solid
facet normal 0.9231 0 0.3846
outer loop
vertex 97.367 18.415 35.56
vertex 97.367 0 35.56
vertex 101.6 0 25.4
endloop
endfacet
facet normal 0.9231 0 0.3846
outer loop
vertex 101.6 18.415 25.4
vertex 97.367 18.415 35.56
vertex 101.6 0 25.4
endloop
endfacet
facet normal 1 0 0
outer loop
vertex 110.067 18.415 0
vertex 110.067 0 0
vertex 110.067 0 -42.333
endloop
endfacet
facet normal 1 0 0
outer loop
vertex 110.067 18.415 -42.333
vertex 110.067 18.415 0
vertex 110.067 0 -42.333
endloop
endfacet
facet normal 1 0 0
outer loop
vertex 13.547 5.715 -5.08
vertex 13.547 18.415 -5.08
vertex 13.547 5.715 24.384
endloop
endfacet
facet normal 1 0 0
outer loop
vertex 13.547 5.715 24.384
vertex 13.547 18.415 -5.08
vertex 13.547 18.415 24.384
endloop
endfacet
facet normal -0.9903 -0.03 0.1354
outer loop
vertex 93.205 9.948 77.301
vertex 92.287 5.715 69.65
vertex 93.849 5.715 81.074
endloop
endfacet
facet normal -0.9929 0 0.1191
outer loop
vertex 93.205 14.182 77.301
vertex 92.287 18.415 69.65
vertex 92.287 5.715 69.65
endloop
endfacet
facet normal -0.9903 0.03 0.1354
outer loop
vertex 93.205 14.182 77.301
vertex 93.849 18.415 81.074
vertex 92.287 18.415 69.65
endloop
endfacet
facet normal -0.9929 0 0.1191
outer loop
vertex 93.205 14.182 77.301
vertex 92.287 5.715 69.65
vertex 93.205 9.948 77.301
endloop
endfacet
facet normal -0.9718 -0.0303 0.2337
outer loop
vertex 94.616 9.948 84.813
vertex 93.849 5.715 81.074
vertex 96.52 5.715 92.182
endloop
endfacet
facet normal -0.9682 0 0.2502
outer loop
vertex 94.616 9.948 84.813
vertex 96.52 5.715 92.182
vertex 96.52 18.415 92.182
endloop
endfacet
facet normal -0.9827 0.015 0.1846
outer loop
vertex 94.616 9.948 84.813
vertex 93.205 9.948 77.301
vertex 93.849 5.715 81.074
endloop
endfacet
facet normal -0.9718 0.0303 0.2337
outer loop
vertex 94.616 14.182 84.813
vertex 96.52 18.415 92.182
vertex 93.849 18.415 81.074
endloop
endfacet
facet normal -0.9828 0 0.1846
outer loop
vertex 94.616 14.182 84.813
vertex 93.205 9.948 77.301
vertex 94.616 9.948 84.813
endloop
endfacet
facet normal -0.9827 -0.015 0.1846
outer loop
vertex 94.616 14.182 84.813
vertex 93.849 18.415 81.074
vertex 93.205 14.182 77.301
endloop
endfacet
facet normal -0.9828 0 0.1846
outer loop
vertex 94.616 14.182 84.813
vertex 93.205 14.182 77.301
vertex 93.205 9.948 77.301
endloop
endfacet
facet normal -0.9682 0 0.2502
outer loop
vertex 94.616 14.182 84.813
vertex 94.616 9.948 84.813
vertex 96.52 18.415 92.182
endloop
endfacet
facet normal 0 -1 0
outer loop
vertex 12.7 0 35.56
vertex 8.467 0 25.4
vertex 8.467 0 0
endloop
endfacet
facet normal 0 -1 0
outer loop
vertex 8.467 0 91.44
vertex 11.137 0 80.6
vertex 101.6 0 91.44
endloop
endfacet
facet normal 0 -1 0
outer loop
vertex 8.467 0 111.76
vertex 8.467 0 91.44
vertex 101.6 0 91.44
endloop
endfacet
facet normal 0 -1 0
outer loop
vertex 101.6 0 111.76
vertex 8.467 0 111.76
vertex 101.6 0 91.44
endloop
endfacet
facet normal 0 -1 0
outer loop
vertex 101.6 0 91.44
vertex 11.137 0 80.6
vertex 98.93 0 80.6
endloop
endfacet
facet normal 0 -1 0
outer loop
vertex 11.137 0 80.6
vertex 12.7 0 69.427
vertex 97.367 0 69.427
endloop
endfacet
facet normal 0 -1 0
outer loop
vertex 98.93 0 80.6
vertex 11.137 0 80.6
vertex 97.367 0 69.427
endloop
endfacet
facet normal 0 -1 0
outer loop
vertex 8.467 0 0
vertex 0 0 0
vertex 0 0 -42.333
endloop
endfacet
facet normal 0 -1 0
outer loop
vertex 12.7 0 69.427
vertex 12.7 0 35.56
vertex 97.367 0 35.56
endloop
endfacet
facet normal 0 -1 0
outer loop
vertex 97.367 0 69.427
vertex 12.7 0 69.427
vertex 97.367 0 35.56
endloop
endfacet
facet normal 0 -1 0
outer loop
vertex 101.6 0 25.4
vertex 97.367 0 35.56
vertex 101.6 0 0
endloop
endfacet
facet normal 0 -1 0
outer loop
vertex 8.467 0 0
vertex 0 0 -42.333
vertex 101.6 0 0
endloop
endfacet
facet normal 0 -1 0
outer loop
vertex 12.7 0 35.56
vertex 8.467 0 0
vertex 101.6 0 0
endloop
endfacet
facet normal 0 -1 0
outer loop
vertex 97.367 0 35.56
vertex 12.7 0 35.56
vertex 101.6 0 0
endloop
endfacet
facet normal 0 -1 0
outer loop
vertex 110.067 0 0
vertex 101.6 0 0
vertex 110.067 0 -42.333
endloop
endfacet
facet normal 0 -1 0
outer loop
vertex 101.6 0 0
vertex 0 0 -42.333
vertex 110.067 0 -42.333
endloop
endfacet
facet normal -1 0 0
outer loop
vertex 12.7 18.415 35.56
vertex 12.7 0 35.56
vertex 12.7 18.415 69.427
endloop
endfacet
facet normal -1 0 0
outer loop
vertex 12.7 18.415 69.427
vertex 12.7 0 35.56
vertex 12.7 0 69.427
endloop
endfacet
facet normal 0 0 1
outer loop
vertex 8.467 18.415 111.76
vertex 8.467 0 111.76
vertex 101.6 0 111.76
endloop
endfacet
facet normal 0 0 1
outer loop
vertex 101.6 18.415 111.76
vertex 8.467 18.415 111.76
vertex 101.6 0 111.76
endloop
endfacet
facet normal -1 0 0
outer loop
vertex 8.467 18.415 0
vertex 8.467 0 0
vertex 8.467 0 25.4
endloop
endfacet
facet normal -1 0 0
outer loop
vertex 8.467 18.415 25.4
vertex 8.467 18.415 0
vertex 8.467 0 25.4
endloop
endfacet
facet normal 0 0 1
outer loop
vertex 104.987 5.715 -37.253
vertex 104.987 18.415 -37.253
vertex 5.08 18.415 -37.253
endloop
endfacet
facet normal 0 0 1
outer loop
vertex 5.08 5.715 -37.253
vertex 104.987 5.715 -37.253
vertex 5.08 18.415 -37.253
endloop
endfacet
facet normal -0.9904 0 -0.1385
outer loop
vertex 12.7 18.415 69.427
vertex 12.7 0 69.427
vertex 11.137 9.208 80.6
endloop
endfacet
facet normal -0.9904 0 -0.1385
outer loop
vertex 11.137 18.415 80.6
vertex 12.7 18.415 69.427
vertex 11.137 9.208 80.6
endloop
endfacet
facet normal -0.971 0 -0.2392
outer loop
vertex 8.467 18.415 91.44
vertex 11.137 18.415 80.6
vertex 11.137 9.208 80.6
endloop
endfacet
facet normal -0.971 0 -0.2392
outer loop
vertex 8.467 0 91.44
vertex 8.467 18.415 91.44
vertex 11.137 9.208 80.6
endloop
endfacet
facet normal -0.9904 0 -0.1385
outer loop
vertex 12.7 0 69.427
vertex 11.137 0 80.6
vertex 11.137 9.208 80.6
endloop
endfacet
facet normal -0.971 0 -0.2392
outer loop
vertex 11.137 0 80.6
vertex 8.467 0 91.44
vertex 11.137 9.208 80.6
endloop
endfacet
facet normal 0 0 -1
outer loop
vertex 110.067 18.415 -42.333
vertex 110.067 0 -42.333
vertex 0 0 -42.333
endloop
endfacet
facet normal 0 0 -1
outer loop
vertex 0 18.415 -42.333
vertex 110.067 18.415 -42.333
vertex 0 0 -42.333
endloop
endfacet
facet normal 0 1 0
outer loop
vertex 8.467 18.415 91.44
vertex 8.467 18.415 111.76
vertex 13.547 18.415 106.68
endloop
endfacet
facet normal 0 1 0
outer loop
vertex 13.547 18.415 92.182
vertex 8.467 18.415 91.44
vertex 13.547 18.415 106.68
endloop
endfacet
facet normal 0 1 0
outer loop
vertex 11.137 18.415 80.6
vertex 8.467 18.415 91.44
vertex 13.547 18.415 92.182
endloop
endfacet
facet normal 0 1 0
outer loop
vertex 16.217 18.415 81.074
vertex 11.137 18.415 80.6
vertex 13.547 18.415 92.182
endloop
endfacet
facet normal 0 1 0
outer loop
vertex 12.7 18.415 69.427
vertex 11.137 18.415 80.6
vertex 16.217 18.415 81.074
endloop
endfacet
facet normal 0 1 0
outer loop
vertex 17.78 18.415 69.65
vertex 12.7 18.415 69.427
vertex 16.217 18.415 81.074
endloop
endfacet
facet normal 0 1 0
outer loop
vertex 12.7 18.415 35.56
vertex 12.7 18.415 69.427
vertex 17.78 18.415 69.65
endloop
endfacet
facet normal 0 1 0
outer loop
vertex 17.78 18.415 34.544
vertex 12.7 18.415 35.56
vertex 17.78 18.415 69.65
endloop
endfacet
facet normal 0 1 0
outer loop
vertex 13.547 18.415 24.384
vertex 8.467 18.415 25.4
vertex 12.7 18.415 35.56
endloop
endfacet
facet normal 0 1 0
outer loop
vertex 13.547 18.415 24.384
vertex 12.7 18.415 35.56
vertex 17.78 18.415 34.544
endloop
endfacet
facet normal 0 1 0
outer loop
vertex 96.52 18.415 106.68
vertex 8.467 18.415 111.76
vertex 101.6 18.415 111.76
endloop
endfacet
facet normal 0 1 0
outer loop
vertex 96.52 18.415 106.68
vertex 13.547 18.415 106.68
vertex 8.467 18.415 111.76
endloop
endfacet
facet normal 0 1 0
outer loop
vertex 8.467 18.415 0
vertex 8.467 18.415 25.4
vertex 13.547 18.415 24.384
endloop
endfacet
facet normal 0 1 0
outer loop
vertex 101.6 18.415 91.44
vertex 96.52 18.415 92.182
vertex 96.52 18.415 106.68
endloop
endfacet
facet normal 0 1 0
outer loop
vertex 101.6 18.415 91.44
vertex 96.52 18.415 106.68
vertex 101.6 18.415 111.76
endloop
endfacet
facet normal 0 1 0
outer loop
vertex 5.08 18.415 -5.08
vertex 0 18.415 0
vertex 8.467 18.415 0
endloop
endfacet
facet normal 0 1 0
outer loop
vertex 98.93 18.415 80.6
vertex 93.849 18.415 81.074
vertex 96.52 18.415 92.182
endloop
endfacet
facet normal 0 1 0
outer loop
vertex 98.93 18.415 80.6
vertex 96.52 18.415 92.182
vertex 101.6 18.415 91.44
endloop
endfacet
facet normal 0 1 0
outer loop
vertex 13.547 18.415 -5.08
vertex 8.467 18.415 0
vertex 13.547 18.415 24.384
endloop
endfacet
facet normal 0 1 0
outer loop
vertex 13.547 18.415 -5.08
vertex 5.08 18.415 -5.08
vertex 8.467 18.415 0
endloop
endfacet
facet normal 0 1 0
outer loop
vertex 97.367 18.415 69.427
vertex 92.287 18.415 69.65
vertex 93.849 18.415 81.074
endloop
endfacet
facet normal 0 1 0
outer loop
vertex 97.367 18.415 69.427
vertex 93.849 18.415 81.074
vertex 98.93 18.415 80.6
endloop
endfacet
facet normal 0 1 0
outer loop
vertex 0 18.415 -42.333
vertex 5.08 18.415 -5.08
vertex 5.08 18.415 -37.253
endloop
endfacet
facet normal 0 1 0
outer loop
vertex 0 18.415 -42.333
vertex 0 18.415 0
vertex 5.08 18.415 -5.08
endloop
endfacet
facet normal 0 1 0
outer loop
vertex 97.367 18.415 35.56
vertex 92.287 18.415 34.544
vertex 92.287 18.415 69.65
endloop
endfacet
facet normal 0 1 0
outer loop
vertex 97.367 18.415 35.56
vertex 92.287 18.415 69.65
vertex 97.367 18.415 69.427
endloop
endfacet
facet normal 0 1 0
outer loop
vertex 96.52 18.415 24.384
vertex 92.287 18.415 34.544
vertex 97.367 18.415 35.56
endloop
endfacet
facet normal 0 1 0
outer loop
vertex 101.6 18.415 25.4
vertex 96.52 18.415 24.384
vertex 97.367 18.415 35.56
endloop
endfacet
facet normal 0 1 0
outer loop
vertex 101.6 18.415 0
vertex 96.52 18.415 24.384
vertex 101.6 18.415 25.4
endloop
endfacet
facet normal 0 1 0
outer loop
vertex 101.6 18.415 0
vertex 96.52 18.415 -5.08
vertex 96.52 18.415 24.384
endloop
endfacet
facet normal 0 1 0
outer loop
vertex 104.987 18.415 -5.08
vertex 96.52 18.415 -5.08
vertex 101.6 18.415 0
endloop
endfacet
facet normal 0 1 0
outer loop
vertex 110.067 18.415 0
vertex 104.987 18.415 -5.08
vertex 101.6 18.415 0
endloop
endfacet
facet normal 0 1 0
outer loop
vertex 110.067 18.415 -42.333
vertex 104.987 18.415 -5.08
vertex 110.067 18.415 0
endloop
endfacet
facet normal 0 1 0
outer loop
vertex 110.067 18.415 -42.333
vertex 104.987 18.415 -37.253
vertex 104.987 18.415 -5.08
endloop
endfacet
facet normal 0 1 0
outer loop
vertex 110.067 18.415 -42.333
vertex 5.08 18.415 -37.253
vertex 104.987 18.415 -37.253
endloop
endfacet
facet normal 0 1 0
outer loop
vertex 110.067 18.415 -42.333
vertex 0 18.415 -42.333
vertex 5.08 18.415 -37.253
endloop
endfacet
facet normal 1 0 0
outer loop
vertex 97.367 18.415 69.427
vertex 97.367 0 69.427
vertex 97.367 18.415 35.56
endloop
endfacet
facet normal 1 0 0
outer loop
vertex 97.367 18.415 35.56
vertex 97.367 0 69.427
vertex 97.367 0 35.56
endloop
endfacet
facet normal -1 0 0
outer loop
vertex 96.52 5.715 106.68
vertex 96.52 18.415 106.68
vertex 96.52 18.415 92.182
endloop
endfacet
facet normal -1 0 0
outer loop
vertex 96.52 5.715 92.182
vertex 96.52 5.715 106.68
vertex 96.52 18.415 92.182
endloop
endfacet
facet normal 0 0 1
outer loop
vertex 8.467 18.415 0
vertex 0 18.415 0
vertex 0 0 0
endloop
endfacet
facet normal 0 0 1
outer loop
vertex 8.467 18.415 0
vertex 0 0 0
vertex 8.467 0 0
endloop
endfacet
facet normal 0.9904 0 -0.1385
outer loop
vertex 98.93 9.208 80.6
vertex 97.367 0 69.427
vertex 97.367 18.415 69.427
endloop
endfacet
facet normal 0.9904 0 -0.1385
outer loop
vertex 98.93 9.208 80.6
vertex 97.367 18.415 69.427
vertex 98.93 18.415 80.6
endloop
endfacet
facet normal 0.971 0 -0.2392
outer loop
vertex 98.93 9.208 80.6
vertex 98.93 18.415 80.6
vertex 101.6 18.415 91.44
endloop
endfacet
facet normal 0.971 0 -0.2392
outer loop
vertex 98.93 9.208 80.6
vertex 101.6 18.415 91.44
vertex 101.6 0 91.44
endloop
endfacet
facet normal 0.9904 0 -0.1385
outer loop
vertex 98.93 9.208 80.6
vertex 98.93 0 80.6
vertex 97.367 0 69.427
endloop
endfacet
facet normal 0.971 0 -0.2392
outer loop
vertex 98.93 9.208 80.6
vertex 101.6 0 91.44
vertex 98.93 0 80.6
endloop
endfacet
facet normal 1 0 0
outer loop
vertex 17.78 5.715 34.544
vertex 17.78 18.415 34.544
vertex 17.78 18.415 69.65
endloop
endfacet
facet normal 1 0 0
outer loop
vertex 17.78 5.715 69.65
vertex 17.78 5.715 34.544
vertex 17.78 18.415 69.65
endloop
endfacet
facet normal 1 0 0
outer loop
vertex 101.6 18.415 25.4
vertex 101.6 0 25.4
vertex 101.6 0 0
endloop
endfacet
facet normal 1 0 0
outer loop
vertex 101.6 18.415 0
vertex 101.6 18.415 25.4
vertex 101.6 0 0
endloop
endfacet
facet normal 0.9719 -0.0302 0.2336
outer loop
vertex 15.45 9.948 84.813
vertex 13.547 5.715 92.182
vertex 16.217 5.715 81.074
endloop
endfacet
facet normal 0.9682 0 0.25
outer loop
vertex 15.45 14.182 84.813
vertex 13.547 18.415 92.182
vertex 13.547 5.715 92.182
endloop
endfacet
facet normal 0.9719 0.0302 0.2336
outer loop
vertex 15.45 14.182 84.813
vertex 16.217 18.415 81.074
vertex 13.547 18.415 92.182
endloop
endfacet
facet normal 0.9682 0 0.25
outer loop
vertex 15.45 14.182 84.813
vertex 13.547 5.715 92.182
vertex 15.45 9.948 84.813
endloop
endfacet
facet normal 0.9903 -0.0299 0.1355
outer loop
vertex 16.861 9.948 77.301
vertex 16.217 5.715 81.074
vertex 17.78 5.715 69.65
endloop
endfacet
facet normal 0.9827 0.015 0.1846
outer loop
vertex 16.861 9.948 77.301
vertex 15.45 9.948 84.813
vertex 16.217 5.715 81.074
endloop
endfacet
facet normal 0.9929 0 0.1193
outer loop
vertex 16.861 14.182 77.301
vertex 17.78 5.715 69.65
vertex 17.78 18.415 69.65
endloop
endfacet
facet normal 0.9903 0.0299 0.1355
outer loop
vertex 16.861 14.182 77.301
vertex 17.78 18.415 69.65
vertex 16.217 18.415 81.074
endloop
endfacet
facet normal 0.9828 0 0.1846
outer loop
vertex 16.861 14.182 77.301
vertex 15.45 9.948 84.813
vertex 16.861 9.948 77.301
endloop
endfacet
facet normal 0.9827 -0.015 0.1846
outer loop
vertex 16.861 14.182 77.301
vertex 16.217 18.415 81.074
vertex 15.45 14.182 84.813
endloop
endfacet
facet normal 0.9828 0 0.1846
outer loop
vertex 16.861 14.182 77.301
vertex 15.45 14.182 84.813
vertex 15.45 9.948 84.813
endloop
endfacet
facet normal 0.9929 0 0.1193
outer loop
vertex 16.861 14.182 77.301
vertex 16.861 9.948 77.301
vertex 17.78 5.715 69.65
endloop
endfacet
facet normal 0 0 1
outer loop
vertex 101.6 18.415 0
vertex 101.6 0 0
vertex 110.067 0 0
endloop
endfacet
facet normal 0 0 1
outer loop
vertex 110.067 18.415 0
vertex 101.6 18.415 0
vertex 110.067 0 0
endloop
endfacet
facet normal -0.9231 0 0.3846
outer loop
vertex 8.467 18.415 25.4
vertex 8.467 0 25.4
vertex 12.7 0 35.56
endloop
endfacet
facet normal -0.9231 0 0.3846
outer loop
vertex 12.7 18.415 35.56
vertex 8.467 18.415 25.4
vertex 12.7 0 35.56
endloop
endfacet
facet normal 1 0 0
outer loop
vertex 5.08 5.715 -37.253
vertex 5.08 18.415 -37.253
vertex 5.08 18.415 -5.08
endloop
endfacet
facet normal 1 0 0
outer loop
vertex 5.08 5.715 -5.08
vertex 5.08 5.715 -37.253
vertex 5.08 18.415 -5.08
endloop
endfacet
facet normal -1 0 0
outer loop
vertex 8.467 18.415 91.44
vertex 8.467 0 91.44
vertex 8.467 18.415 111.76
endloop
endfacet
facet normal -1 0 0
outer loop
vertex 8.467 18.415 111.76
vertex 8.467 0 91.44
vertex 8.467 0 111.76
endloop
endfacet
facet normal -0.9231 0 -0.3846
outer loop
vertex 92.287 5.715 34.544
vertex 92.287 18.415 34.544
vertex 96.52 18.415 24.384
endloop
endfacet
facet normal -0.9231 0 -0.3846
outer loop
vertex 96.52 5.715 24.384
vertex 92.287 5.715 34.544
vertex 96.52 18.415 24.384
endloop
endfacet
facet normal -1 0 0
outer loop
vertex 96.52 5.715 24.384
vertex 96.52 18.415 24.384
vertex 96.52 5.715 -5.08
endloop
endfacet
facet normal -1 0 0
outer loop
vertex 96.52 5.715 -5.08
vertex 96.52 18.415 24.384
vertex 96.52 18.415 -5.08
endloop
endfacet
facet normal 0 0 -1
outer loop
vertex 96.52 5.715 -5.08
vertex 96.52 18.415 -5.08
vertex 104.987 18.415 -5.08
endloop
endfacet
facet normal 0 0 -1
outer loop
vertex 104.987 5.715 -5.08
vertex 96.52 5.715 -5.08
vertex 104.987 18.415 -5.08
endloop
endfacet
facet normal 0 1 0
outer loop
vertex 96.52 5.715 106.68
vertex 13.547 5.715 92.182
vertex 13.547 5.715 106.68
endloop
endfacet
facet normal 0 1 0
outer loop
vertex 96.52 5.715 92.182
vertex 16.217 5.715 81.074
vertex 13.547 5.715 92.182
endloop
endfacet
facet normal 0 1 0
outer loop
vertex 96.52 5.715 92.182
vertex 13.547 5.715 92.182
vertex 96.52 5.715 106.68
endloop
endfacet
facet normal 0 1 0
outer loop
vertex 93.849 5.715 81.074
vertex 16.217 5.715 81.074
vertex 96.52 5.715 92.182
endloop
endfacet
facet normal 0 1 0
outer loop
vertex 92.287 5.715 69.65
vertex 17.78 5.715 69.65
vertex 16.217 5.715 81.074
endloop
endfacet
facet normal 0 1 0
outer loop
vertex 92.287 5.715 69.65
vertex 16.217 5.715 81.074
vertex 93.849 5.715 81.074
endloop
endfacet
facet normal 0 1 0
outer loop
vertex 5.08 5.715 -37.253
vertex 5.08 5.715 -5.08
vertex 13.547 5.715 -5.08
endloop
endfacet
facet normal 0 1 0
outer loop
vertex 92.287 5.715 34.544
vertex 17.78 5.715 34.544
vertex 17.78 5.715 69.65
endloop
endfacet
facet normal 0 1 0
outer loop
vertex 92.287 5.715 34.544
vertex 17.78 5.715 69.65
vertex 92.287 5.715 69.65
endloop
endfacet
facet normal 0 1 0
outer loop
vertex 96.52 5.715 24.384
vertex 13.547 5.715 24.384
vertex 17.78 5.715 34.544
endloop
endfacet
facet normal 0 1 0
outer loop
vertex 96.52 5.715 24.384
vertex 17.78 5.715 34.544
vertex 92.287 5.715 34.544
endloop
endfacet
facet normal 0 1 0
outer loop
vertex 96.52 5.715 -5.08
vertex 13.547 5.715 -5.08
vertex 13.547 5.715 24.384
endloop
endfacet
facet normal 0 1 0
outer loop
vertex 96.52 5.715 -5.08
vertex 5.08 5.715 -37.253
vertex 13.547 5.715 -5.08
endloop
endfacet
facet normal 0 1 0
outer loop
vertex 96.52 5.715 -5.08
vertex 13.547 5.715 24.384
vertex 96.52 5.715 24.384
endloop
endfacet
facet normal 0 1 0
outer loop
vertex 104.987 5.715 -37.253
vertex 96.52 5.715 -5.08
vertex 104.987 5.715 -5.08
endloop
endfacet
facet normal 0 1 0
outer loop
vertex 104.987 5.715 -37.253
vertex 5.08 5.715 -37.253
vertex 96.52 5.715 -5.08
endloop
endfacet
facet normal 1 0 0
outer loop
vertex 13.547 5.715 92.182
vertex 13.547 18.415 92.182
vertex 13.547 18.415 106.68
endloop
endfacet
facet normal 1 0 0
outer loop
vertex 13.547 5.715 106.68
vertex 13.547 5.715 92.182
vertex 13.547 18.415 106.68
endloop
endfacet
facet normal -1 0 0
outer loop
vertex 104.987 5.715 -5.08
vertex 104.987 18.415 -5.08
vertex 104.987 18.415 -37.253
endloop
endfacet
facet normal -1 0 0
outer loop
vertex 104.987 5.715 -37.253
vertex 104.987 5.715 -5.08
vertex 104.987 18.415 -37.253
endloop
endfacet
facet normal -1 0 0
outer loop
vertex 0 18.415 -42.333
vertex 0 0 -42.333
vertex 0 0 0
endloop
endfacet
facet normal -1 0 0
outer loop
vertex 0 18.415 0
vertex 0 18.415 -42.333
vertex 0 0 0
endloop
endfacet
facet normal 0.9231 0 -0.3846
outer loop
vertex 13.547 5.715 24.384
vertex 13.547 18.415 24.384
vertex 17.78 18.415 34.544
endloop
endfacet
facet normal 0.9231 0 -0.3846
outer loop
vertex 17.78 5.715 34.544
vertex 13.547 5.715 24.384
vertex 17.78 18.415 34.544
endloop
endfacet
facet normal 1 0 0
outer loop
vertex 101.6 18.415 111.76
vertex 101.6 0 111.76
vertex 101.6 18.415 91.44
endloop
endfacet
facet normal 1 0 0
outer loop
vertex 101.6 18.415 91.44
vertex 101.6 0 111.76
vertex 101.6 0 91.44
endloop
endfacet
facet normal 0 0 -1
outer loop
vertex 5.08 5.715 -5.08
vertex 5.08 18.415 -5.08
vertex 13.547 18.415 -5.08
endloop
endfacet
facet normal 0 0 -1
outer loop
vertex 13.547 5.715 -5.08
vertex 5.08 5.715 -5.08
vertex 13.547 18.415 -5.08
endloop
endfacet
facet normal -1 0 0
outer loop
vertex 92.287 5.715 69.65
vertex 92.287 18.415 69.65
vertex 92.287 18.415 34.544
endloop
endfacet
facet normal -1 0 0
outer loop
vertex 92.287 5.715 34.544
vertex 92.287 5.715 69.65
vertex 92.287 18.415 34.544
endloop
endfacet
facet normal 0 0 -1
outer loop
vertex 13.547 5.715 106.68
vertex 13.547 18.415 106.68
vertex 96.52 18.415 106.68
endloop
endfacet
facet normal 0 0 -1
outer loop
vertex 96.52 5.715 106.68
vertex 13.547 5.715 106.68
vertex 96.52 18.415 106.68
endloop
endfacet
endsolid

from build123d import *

# Parameters (mm, degrees)
BOSS_EXTRUDE1_DEPTH = 18.415
CUT_EXTRUDE1_DEPTH  = 12.7


with BuildPart() as part:
    # Sketch3 → Boss-Extrude1 (new body)
    with BuildSketch(Plane(origin=(0, 0, 0), x_dir=(1, 0, 0), z_dir=(0, 1, 0))):
        with BuildLine():
            Line((101.599873, 0), (110.066582, 0))
            Line((110.066582, 0), (110.066582, 42.333418))
            Line((110.066582, 42.333418), (55.033291, 42.333418))
            Line((55.033291, 42.333418), (8.4666328, 42.333418))
            Line((8.4666328, 42.333418), (0, 42.333418))
            Line((0, 42.333418), (0, 0))
            Line((0, 0), (8.4666328, 0))
            Line((8.4666328, 0), (8.4666328, -25.4))
            Line((8.4666328, -25.4), (12.6999492, -35.56))
            Line((12.6999492, -35.56), (12.6999492, -69.426582))
            add(Edge.make_bspline(
                [(12.6999492, -69.426582), (11.690404189, -80.766544706), (8.46666328, -91.44)],
                knots=[0, 0, 0, 0.504540069, 0.504540069, 0.504540069], degree=2))
            Line((8.46666328, -91.44), (8.46666328, -111.76))
            Line((8.46666328, -111.76), (101.599995682, -111.76))
            Line((101.599995682, -111.76), (101.599995682, -91.44))
            add(Edge.make_bspline(
                [(97.366709, -69.426582), (98.376270675, -80.766537876), (101.599995682, -91.44)],
                knots=[0, 0, 0, 0.504540407, 0.504540407, 0.504540407], degree=2))
            Line((97.366709, -69.426582), (97.366709, -35.56))
            Line((97.366709, -35.56), (101.599873, -25.4))
            Line((101.599873, -25.4), (101.599873, 0))
        make_face()
    extrude(amount=BOSS_EXTRUDE1_DEPTH)

    # Sketch7 → Cut-Extrude1 (cut)
    with BuildSketch(Plane(origin=(0, 18.415, 0), x_dir=(1, 0, 0), z_dir=(0, 1, 0))):
        with BuildLine():
            Line((104.986582, 5.08), (104.986582, 37.253418))
            Line((104.986582, 37.253418), (5.08, 37.253418))
            Line((5.08, 37.253418), (5.08, 5.08))
            Line((5.08, 5.08), (13.5466328, 5.08))
            Line((13.5466328, 5.08), (13.5466328, -24.384003751))
            Line((13.5466328, -24.384003751), (17.7799492, -34.544003751))
            Line((17.7799492, -34.544003751), (17.7799492, -69.649806794))
            add(Edge.make_bspline(
                [(13.54666328, -92.18157962), (15.696718758, -84.885689198), (17.107633166, -77.368389863), (17.7799492, -69.649806794)],
                knots=[0, 0, 0, 0, 1, 1, 1, 1], degree=3))
            Line((13.54666328, -92.18157962), (13.54666328, -106.68))
            Line((13.54666328, -106.68), (96.519995682, -106.68))
            Line((96.519995682, -106.68), (96.519995682, -92.1815758))
            add(Edge.make_bspline(
                [(92.286709, -69.649810631), (92.959036165, -77.368387225), (94.369950858, -84.885683715), (96.519995682, -92.1815758)],
                knots=[0, 0, 0, 0, 1, 1, 1, 1], degree=3))
            Line((92.286709, -69.649810631), (92.286709, -34.544037514))
            Line((92.286709, -34.544037514), (96.519873, -24.384037514))
            Line((96.519873, -24.384037514), (96.519873, 5.08))
            Line((96.519873, 5.08), (104.986582, 5.08))
        make_face()
    extrude(amount=-CUT_EXTRUDE1_DEPTH, mode=Mode.SUBTRACT)


solid = part.part
